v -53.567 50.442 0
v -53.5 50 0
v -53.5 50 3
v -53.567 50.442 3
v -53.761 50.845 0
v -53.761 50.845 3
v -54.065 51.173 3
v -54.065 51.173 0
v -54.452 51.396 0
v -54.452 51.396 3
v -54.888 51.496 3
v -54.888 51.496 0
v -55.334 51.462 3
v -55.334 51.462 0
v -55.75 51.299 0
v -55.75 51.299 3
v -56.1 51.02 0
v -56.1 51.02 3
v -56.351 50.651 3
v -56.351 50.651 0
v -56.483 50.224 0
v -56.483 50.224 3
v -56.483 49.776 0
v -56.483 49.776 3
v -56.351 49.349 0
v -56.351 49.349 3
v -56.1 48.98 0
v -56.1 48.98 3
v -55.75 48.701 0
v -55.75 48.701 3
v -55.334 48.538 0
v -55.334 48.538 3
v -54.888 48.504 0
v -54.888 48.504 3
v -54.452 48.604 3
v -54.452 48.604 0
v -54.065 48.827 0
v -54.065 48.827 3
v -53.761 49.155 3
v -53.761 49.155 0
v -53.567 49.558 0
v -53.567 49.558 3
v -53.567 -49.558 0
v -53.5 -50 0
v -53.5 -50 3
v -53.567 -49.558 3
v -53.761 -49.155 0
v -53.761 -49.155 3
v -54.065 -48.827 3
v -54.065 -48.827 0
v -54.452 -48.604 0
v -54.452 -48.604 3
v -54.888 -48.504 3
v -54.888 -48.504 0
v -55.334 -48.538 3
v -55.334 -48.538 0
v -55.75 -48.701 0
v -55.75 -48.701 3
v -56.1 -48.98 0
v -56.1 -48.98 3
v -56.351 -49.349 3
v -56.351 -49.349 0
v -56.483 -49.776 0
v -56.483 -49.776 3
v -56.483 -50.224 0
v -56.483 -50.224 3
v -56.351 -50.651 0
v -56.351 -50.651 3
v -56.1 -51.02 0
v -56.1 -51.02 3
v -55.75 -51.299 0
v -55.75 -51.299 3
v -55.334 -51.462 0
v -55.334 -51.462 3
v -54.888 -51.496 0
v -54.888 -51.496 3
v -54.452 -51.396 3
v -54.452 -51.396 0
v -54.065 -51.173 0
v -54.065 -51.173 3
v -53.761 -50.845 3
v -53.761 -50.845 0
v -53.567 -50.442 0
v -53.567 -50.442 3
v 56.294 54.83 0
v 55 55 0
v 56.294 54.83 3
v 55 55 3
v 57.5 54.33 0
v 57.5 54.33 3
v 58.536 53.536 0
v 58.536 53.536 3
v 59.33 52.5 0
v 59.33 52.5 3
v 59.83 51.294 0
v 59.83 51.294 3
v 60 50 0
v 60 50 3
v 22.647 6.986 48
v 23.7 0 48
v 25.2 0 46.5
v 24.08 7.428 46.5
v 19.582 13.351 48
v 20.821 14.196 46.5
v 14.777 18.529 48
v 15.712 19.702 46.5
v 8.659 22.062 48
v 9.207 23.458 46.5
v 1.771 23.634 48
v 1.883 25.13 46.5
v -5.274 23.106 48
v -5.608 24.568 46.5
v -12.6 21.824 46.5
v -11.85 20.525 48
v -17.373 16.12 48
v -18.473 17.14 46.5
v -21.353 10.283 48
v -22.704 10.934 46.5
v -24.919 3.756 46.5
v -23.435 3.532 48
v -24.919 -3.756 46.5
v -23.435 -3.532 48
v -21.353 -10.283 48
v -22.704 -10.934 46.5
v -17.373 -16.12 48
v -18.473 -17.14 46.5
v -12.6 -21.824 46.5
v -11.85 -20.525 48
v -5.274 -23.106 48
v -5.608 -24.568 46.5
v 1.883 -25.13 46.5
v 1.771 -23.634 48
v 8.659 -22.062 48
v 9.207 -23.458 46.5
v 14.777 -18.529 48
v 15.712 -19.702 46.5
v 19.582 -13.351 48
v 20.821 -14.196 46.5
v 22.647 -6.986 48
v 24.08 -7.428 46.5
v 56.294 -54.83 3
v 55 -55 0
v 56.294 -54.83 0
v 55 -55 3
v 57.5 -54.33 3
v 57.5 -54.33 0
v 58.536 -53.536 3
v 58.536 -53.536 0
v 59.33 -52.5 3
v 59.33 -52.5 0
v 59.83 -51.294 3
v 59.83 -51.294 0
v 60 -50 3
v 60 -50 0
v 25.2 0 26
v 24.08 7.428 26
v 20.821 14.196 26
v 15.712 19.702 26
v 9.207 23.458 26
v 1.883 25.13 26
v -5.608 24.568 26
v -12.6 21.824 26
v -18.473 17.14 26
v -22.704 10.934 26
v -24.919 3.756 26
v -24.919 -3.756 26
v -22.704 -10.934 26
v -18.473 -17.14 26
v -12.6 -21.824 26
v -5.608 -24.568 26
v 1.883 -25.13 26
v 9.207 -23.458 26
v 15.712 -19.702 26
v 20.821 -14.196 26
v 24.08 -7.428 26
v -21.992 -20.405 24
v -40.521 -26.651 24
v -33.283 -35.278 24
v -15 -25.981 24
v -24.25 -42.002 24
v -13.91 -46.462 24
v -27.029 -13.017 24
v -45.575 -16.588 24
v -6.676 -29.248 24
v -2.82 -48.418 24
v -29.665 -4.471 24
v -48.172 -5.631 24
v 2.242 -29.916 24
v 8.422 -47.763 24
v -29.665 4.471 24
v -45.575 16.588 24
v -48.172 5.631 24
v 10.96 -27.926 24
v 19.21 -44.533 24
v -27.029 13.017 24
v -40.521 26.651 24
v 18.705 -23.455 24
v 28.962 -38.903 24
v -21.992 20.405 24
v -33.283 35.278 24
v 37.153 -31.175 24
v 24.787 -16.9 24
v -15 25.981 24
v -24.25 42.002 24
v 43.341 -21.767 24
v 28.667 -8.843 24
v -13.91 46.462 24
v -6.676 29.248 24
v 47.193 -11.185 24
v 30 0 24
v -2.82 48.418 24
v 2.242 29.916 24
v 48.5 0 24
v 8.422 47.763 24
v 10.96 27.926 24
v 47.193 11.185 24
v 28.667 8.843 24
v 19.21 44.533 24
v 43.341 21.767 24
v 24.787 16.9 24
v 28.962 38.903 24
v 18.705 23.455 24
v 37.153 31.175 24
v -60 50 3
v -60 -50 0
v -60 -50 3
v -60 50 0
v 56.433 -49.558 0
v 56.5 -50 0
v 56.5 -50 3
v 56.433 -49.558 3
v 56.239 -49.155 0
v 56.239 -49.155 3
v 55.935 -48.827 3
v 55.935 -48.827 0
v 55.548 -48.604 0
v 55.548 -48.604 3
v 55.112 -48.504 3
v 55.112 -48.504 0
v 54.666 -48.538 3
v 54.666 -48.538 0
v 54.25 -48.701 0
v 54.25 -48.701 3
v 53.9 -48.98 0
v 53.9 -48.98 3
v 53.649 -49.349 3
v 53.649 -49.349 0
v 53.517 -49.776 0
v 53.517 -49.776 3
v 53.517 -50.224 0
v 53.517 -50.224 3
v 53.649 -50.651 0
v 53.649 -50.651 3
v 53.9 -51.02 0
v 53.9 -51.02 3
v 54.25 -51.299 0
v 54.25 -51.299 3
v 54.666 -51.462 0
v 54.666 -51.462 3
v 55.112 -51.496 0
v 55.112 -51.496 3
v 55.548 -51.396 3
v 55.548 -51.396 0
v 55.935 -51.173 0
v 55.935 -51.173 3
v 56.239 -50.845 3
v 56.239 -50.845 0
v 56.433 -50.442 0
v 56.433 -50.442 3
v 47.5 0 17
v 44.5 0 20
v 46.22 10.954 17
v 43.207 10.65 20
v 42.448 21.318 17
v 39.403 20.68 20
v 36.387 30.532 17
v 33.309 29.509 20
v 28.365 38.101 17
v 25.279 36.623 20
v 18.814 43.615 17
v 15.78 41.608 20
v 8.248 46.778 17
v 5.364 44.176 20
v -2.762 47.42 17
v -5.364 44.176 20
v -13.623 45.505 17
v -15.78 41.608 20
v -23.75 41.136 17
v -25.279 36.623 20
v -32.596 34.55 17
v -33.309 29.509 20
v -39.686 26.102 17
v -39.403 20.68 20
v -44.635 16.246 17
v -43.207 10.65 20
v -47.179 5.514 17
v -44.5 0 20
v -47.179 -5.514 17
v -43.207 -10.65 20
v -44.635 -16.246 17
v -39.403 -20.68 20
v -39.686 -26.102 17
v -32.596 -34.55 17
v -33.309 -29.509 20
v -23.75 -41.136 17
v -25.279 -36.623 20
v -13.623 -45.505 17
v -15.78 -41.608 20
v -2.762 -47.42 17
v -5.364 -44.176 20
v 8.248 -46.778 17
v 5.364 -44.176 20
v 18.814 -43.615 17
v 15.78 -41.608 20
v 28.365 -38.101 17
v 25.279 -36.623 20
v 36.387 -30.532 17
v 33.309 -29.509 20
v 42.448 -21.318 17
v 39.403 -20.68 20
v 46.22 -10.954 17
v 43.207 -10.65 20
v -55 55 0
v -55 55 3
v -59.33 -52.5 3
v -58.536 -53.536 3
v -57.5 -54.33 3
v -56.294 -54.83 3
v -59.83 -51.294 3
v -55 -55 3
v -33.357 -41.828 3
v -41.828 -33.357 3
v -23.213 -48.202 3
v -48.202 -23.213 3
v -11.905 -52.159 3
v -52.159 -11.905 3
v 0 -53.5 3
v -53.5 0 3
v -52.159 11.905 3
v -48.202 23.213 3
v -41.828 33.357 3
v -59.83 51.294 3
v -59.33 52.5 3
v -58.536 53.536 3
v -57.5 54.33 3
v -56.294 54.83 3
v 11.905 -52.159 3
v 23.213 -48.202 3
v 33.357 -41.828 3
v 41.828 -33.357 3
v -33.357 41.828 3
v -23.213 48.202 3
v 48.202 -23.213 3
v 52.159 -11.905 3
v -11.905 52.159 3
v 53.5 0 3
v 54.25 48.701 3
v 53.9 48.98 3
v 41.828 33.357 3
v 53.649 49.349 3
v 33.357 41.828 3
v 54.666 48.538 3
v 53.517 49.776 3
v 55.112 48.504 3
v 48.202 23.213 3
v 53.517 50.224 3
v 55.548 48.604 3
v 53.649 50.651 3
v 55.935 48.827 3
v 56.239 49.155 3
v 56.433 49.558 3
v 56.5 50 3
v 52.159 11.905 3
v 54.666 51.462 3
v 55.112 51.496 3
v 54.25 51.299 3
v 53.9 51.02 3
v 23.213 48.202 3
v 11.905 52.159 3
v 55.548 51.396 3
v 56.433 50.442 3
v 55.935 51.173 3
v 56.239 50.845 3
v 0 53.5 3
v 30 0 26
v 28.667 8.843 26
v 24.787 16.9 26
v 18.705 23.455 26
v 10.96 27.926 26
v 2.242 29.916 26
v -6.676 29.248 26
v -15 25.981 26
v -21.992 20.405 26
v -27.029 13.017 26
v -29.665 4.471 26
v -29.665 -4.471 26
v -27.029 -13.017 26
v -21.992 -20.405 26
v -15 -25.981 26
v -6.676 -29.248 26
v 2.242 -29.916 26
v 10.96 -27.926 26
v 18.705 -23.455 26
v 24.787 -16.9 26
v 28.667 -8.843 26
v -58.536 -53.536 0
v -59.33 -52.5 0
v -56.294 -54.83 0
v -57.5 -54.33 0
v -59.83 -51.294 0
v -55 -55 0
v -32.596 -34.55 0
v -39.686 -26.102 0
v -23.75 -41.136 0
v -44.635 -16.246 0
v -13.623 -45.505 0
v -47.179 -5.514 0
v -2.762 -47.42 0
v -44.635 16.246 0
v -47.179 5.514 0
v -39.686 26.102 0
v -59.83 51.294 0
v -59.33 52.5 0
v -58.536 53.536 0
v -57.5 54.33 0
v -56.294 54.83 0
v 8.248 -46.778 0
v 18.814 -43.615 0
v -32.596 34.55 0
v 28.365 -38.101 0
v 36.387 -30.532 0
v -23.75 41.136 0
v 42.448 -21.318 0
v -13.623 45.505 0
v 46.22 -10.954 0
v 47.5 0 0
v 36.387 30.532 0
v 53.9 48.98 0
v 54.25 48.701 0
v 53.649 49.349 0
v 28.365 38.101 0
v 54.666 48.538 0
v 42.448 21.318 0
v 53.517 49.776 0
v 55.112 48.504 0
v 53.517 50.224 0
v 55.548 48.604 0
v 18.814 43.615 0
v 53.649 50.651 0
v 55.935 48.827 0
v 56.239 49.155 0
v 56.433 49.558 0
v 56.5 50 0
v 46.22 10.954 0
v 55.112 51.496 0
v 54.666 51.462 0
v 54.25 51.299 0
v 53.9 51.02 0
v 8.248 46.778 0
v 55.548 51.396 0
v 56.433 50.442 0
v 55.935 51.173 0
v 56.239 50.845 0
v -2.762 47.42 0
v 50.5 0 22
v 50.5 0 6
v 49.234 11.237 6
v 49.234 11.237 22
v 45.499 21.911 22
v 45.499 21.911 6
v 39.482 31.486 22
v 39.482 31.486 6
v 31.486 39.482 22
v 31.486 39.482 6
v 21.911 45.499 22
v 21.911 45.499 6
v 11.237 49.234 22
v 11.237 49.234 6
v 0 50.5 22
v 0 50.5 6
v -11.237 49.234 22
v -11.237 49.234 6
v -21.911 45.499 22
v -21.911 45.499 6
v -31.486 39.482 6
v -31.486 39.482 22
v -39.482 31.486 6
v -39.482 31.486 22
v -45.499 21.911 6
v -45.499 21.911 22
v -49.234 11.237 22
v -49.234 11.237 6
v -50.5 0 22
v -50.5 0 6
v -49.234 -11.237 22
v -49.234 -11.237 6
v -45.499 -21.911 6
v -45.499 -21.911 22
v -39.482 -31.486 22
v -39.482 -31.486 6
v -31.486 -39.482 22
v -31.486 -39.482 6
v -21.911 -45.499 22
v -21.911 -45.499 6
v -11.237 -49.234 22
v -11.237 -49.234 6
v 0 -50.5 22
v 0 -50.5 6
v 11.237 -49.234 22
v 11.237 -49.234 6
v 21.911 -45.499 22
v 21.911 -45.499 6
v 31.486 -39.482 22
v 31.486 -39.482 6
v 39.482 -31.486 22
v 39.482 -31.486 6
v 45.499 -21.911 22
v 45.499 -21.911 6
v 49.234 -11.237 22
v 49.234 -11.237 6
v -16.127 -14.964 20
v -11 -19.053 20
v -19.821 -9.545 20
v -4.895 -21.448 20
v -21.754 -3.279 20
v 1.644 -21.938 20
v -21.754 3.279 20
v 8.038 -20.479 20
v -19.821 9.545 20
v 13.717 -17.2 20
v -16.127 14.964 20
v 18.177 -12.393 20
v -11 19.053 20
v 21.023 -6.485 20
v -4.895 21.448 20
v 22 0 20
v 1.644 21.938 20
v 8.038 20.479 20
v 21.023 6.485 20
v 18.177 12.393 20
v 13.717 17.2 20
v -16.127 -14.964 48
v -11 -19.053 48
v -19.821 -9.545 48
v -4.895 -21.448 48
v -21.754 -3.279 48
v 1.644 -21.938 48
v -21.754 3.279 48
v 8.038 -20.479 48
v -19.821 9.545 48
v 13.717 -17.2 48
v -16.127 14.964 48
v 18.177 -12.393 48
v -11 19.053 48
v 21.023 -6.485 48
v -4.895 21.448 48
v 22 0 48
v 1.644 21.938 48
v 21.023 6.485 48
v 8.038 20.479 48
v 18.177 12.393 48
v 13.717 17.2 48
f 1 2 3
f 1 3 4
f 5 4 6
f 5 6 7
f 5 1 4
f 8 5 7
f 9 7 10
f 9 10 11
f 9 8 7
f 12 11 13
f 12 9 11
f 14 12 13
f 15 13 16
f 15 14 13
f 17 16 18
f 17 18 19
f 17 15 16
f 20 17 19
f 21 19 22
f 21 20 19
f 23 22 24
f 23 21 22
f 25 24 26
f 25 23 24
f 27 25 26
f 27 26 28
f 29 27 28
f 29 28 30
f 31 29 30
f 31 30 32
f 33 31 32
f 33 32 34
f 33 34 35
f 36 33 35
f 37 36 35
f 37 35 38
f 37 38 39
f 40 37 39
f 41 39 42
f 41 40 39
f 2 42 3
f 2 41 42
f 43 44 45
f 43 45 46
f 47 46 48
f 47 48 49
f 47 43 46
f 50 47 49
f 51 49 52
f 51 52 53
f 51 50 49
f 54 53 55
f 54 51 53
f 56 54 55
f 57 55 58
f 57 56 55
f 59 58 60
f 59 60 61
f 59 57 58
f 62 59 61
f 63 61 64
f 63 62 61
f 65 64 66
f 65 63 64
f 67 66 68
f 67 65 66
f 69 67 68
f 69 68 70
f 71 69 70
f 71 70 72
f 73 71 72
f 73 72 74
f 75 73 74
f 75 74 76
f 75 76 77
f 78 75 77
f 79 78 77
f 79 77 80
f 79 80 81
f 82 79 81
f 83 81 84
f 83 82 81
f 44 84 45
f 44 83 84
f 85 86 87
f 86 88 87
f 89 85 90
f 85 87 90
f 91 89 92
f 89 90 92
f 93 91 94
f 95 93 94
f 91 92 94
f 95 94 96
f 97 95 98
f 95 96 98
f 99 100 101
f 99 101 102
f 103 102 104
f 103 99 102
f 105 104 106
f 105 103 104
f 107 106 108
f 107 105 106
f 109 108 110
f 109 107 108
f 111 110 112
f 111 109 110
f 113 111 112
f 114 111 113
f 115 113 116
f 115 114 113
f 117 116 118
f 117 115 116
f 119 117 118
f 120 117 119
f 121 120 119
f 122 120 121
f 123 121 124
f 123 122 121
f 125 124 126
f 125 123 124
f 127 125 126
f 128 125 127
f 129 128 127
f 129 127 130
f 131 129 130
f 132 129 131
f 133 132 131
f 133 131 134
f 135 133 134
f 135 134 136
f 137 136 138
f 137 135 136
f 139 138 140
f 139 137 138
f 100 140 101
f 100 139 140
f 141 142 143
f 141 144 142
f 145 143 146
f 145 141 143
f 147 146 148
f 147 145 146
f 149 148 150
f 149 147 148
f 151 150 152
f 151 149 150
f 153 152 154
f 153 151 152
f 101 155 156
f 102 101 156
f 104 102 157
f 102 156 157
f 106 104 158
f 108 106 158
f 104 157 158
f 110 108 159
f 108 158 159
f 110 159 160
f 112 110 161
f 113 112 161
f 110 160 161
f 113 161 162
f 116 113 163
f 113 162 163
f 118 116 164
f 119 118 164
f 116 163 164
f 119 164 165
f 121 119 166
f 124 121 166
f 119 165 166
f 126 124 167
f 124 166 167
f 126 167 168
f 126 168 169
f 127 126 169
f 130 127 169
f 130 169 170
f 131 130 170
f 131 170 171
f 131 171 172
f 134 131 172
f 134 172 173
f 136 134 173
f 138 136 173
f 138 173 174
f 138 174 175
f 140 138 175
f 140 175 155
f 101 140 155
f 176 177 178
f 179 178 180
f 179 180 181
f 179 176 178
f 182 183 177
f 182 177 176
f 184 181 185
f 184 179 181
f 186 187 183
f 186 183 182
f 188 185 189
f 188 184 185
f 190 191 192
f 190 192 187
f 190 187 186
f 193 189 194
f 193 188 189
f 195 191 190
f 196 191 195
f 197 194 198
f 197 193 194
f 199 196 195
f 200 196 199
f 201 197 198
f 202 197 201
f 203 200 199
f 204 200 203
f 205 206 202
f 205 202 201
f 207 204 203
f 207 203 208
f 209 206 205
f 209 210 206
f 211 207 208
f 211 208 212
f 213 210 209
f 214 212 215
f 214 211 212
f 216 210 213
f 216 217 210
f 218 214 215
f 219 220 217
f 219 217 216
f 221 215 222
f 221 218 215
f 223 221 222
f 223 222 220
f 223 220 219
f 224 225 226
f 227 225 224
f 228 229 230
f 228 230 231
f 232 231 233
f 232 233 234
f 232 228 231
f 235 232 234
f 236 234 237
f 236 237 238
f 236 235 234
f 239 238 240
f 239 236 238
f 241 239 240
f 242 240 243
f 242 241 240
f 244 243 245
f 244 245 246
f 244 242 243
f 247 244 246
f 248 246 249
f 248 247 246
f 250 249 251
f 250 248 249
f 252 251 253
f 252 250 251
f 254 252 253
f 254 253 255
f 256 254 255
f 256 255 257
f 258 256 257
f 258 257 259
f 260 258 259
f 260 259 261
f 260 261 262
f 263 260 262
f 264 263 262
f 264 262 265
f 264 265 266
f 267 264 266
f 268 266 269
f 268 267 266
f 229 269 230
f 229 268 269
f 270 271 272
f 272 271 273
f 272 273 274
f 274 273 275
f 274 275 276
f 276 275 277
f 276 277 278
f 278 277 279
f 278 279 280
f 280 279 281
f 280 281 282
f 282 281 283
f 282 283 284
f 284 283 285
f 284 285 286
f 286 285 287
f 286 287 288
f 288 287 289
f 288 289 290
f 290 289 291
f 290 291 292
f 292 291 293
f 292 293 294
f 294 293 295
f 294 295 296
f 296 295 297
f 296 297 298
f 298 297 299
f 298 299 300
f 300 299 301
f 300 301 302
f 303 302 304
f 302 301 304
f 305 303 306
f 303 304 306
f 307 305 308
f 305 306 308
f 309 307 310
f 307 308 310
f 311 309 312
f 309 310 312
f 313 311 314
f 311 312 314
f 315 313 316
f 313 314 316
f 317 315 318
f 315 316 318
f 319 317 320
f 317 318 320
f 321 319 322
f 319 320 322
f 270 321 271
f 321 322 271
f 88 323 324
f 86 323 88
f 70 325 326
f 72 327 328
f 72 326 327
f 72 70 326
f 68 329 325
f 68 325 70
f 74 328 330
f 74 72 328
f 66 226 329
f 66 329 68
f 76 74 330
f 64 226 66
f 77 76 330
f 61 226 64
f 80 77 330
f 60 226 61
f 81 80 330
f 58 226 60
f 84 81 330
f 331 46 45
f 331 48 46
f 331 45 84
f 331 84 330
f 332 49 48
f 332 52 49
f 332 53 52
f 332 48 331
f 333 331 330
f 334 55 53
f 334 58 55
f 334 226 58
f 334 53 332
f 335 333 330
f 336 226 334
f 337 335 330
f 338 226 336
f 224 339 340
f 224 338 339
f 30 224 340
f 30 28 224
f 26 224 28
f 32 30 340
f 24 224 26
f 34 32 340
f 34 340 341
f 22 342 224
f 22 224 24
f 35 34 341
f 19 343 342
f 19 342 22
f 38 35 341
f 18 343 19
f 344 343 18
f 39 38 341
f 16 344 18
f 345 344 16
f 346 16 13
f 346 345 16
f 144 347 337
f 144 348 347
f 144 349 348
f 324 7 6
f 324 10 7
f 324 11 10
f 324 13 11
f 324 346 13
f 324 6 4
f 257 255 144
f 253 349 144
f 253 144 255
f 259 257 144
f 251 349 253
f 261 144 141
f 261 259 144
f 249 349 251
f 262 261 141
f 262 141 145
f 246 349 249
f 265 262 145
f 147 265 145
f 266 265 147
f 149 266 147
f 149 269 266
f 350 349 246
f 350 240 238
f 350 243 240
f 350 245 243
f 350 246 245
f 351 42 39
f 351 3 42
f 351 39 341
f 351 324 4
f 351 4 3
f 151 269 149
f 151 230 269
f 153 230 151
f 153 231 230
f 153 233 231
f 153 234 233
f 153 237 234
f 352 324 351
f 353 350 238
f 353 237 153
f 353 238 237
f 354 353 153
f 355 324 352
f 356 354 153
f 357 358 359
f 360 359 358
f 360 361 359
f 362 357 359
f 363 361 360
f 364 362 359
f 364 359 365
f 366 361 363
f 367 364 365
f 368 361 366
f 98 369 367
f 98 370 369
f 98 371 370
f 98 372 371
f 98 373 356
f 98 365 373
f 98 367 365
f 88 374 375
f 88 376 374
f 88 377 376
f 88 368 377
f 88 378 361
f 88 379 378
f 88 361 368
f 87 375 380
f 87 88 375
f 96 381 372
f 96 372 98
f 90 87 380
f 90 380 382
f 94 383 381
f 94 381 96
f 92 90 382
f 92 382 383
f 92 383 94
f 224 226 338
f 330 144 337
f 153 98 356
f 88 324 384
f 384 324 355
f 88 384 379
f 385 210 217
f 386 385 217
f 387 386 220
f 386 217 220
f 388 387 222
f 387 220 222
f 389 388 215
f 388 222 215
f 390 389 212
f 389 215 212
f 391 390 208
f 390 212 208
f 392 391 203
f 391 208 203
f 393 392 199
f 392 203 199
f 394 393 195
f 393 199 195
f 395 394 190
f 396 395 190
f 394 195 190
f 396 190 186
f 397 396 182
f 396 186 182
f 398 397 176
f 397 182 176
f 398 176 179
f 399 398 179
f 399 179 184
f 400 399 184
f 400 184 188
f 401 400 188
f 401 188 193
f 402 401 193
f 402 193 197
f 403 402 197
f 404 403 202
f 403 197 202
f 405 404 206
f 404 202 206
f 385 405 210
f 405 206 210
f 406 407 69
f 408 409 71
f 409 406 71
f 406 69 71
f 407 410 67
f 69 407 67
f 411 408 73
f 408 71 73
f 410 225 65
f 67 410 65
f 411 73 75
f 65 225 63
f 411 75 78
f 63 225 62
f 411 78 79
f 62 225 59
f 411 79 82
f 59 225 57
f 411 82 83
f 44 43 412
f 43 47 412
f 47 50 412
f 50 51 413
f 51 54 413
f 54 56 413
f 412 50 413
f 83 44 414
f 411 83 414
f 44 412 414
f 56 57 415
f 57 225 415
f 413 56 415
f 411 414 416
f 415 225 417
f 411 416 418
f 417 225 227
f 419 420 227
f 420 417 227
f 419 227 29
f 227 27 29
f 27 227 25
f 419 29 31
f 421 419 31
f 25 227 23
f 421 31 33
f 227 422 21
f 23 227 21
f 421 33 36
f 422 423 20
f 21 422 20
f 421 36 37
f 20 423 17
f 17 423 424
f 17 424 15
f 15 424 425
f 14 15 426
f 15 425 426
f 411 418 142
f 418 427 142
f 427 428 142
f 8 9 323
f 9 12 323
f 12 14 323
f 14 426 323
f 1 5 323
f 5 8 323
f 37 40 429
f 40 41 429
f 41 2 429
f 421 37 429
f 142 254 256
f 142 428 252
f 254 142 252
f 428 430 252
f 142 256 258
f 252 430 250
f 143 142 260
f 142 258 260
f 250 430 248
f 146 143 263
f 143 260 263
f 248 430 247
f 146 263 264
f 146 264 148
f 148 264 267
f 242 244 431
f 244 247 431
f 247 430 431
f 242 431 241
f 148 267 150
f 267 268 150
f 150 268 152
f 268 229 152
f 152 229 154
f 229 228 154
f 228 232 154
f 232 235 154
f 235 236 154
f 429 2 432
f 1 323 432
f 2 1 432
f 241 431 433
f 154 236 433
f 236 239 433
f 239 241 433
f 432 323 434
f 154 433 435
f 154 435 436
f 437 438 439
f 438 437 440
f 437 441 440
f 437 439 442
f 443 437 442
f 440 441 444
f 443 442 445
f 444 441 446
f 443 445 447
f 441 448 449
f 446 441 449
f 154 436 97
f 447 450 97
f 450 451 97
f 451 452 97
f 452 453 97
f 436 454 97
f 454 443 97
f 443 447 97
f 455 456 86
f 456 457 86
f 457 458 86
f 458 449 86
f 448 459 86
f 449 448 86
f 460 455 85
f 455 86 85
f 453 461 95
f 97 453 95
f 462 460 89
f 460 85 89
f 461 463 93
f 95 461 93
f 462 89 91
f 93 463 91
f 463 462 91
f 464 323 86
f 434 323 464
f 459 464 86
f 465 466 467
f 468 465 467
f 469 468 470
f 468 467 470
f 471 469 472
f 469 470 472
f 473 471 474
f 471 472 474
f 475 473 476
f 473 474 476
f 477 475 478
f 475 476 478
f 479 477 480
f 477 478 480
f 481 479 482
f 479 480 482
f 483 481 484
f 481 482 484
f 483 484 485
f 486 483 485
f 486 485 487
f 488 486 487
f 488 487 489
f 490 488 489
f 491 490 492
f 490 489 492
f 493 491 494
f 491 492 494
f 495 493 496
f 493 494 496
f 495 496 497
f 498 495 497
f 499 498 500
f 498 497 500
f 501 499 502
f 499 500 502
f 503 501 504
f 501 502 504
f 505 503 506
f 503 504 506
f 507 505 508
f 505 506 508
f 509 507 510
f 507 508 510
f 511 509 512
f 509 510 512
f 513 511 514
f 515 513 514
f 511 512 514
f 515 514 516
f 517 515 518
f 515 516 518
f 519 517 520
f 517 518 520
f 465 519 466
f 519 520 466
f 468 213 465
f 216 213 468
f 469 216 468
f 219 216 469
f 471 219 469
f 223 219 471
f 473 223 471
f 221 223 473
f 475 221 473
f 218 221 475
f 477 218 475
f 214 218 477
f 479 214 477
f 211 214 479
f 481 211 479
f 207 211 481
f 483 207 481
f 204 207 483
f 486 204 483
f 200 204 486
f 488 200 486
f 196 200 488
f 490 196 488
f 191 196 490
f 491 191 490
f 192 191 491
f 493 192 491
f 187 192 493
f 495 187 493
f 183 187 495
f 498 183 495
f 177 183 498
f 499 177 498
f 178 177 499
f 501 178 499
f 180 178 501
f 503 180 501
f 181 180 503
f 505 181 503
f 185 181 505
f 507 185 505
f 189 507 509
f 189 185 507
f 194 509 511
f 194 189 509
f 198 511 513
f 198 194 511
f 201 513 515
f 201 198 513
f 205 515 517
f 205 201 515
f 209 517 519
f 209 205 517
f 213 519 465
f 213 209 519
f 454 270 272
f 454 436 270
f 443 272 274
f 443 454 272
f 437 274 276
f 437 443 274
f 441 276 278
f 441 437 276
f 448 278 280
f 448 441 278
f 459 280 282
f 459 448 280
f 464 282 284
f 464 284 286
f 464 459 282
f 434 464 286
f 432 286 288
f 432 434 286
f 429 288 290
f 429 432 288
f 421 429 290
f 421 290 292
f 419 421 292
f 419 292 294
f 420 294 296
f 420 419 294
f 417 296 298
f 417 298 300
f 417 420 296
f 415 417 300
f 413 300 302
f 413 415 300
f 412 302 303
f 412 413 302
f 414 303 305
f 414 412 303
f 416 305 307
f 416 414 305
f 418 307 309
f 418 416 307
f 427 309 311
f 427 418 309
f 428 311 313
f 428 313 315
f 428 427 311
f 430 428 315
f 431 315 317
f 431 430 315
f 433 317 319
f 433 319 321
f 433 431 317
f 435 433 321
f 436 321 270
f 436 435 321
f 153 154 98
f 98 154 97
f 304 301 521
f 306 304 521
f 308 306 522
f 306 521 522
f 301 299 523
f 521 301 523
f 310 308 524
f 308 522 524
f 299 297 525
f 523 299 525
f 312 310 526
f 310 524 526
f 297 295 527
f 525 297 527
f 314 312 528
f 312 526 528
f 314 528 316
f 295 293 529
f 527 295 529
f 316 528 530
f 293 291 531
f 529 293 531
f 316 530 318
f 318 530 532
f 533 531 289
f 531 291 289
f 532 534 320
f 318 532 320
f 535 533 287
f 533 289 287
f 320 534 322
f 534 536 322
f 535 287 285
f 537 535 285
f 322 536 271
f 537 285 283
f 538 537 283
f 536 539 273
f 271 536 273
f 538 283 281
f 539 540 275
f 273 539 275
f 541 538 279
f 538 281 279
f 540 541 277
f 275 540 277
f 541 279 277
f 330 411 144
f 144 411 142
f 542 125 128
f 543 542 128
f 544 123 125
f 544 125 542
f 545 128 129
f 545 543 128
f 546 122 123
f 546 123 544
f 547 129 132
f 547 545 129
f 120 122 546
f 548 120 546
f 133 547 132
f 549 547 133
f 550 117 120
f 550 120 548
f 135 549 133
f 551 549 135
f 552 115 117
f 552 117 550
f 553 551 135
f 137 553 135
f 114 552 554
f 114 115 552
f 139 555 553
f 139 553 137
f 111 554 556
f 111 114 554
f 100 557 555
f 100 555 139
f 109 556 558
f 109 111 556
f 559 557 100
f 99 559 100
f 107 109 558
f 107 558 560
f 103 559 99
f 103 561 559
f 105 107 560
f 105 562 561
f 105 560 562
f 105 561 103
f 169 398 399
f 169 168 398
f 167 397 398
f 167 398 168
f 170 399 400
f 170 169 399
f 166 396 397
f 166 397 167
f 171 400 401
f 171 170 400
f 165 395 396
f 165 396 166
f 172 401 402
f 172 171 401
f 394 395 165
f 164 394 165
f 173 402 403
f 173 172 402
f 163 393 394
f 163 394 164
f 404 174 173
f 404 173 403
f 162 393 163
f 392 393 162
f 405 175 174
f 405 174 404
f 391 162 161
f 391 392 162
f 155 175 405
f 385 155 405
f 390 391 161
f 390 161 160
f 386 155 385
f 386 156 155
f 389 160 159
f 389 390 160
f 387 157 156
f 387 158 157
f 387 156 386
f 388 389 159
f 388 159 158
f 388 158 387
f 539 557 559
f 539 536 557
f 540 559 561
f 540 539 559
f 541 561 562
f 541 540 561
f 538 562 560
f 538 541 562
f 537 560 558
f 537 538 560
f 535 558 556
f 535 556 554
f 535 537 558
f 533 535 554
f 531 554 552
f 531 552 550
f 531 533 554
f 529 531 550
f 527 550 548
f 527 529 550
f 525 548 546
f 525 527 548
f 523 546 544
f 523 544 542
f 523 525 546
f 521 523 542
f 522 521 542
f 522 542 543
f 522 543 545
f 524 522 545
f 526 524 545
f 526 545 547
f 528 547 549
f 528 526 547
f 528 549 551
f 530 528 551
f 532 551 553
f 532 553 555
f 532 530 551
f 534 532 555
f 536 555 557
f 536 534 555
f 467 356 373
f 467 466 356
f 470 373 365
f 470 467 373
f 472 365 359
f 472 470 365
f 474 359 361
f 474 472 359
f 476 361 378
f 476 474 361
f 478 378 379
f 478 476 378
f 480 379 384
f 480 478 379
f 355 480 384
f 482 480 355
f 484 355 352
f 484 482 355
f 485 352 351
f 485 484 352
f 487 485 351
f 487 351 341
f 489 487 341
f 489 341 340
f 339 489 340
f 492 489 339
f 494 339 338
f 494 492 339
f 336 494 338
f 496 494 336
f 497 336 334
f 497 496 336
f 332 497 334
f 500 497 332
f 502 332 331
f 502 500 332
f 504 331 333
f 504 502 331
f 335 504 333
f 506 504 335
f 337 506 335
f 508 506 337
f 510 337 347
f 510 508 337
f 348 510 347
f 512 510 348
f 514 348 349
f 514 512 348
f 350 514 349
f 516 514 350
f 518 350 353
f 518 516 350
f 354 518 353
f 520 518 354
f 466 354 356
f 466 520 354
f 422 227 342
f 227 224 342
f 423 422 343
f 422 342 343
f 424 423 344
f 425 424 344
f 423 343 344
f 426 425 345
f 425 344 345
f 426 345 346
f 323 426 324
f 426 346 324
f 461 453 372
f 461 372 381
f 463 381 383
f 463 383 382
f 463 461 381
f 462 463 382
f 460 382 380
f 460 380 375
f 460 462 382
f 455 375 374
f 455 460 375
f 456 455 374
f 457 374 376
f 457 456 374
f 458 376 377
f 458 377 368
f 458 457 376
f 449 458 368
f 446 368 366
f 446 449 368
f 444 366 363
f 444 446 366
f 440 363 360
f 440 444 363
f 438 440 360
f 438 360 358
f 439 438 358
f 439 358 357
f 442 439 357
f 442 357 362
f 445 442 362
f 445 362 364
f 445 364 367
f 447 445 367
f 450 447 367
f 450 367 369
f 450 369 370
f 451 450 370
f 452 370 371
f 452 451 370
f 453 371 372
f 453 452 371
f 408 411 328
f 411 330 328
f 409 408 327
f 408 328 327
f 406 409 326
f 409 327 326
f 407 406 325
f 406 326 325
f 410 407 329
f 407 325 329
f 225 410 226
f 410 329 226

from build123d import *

# Parameters (mm, degrees)
SKETCH_W        = 120
SKETCH_H        = 110
SKETCH_R        = 1.5
SKETCH_R_2      = 47.5
PAD_DEPTH       = 3
SKETCH001_R     = 50.5
SKETCH001_R_2   = 47.5
PAD001_DEPTH    = 17
SKETCH008_R     = 50.5
SKETCH008_R_2   = 22
PAD005_DEPTH    = 4
SKETCH004_R     = 30
SKETCH004_R_2   = 25.2
PAD004_DEPTH    = 2
SKETCH009_R     = 25.2
SKETCH009_R_2   = 22
PAD006_DEPTH    = 24
CHAMFER_SIZE    = 2
CHAMFER001_SIZE = 1.5
FILLET_R        = 5
FILLET001_R     = 5
FILLET002_R     = 5


with BuildPart() as part:
    # Sketch → Pad (new body)
    with BuildSketch(Plane.XY):
        Rectangle(SKETCH_W, SKETCH_H)
        with Locations((-55, 50)):
            Circle(SKETCH_R, mode=Mode.SUBTRACT)
        with Locations((-55, -50)):
            Circle(SKETCH_R, mode=Mode.SUBTRACT)
        with Locations((55, 50)):
            Circle(SKETCH_R, mode=Mode.SUBTRACT)
        with Locations((55, -50)):
            Circle(SKETCH_R, mode=Mode.SUBTRACT)
        Circle(SKETCH_R_2, mode=Mode.SUBTRACT)
    extrude(amount=PAD_DEPTH)

    # Sketch001 (on Face11 of Pad) → Pad001 (join)
    with BuildSketch(Plane.XY.offset(3)):
        Circle(SKETCH001_R)
        Circle(SKETCH001_R_2, mode=Mode.SUBTRACT)
    extrude(amount=PAD001_DEPTH)

    # Sketch008 (on Face14 of Pad001) → Pad005 (join)
    with BuildSketch(Plane.XY.offset(20)):
        Circle(SKETCH008_R)
        Circle(SKETCH008_R_2, mode=Mode.SUBTRACT)
    extrude(amount=PAD005_DEPTH)

    # Sketch004 → Pad004 (join)
    with BuildSketch(Plane.XY.offset(24)):
        Circle(SKETCH004_R)
        Circle(SKETCH004_R_2, mode=Mode.SUBTRACT)
    extrude(amount=PAD004_DEPTH)

    # Sketch009 (on Face16 of Pad004) → Pad006 (join)
    with BuildSketch(Plane.XY.offset(24)):
        Circle(SKETCH009_R)
        Circle(SKETCH009_R_2, mode=Mode.SUBTRACT)
    extrude(amount=PAD006_DEPTH)

    # Sketch005 → Revolution (revolve)
    with BuildSketch(Plane.XZ):
        Polygon((47.5, 20), (47.5, 17), (44.5, 20), align=None)
    revolve(axis=Axis((0, 0, 0), (0, 0, 1)))

    # Sketch006 → Revolution001 (revolve)
    with BuildSketch(Plane.XZ):
        Polygon((50.5, 6), (50.5, 3), (53.5, 3), align=None)
    revolve(axis=Axis((0, 0, 0), (0, 0, 1)))

    # Chamfer
    chamfer_edges = [part.edges().sort_by_distance(p)[0] for p in [
        (-50.5, 0, 24),
    ]]
    chamfer(chamfer_edges, length=CHAMFER_SIZE)

    # Chamfer001
    chamfer001_edges = [part.edges().sort_by_distance(p)[0] for p in [
        (-25.2, 0, 48),
    ]]
    chamfer(chamfer001_edges, length=CHAMFER001_SIZE)

    # Fillet
    fillet_edges = [part.edges().sort_by_distance(p)[0] for p in [
        (60, 55, 1.5),
        (60, -55, 1.5),
    ]]
    fillet(fillet_edges, radius=FILLET_R)

    # Fillet001
    fillet001_edges = [part.edges().sort_by_distance(p)[0] for p in [
        (-60, -55, 1.5),
    ]]
    fillet(fillet001_edges, radius=FILLET001_R)

    # Fillet002
    fillet002_edges = [part.edges().sort_by_distance(p)[0] for p in [
        (-60, 55, 1.5),
    ]]
    fillet(fillet002_edges, radius=FILLET002_R)


solid = part.part
